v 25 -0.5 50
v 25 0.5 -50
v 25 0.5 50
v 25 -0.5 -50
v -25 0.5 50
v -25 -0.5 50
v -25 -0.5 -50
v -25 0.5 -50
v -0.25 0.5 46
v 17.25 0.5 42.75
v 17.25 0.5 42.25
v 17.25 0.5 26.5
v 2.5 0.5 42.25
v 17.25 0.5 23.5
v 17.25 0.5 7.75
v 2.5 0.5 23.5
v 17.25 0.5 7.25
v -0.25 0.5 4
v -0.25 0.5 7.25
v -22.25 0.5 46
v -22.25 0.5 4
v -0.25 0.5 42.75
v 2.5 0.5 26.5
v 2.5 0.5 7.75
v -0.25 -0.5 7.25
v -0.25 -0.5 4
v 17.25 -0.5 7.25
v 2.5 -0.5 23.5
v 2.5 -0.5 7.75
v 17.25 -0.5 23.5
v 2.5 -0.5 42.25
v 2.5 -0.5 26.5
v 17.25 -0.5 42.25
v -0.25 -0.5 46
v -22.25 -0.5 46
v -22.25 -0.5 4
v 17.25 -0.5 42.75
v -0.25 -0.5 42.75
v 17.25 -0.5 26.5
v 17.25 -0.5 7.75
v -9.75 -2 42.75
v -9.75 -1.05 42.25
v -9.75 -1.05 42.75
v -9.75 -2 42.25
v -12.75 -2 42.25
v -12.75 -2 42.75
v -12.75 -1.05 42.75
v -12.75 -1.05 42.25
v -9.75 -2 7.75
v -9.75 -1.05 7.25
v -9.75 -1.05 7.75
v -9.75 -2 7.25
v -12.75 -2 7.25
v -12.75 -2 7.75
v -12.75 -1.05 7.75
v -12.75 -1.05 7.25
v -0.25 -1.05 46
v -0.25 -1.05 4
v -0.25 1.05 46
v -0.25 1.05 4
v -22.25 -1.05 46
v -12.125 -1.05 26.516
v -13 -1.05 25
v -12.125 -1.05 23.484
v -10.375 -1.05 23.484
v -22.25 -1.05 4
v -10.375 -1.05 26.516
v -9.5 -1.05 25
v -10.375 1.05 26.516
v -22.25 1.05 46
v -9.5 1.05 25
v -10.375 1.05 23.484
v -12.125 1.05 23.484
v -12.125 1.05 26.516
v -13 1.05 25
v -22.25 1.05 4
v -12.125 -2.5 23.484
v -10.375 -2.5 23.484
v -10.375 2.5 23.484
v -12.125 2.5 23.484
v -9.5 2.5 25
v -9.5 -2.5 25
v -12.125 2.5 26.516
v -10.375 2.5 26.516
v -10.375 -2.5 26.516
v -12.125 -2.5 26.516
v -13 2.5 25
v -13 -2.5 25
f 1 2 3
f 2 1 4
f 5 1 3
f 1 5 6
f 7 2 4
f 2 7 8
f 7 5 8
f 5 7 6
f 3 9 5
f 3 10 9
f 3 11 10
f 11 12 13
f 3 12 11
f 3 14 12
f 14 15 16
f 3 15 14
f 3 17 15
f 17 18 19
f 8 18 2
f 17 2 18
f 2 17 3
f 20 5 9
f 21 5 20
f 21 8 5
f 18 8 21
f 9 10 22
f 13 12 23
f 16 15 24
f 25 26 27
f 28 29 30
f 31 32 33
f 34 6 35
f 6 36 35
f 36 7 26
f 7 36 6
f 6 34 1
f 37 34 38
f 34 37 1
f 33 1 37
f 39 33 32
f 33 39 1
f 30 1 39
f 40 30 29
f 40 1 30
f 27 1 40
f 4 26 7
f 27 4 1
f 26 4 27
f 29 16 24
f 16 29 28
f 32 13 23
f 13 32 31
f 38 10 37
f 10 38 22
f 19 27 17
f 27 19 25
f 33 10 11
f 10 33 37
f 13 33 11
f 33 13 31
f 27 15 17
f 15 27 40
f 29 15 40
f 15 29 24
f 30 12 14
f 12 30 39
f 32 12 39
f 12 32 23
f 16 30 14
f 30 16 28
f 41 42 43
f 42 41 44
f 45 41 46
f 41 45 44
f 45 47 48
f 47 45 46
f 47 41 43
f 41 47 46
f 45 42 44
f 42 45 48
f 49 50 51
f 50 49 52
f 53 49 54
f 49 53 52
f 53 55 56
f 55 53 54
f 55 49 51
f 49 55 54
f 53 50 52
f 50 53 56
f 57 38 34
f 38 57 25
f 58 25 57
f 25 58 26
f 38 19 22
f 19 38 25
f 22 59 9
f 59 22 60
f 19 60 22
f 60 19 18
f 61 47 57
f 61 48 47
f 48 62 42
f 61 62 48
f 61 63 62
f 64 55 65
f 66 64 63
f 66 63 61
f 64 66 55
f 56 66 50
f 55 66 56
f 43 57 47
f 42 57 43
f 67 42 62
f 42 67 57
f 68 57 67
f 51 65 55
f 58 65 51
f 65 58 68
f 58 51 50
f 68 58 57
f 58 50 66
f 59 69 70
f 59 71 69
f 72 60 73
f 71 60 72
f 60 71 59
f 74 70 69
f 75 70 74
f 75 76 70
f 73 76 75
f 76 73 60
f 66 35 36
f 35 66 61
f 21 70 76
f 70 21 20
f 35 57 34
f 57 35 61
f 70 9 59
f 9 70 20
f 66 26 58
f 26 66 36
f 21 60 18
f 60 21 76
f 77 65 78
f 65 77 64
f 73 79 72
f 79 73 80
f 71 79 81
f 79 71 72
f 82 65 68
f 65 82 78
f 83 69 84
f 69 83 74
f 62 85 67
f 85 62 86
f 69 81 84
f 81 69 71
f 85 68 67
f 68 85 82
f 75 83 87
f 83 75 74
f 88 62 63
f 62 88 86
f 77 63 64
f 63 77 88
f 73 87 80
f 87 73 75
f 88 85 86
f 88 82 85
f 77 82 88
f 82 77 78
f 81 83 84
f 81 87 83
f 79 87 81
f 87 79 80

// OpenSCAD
// wall_left
module wall() {
    difference() {
        cube([50, 1, 100], center = true);
        
        translate([0, 0, 25])
        cube([5, 2, 35.5], center = true);
    }
}

module static_razer_mount() {
    razer_pegs();
    #cylinder(5, 1.75, 1.75, center = true);    
}

module razer_pegs() {
    union() {
        color("green")
        translate([0, 17.5, 1])
        cube([3, 0.5, 2], center=true);

        color("green")
        translate([0, -17.5, 1])
        cube([3, 0.5, 2], center=true);
        
        color("#00008060")
        cube([22, 42, 2.1], center=true);
    }
}

module rails() {
    translate([11+0.25 - 2, 0, 25])
    union() {
        translate([0, 0, 17.5])
        #cube([16, 4, 0.5], center=true);
        translate([0, 0, -17.5])
        #cube([16, 4, 0.5], center=true);
        translate([0, 0, 0])
        #cube([16, 4, 3], center=true);
    }
}



difference() {
    wall();
    rails();
}

translate([-11.25, 0, 25])
rotate([90, 0, 0])
static_razer_mount();
